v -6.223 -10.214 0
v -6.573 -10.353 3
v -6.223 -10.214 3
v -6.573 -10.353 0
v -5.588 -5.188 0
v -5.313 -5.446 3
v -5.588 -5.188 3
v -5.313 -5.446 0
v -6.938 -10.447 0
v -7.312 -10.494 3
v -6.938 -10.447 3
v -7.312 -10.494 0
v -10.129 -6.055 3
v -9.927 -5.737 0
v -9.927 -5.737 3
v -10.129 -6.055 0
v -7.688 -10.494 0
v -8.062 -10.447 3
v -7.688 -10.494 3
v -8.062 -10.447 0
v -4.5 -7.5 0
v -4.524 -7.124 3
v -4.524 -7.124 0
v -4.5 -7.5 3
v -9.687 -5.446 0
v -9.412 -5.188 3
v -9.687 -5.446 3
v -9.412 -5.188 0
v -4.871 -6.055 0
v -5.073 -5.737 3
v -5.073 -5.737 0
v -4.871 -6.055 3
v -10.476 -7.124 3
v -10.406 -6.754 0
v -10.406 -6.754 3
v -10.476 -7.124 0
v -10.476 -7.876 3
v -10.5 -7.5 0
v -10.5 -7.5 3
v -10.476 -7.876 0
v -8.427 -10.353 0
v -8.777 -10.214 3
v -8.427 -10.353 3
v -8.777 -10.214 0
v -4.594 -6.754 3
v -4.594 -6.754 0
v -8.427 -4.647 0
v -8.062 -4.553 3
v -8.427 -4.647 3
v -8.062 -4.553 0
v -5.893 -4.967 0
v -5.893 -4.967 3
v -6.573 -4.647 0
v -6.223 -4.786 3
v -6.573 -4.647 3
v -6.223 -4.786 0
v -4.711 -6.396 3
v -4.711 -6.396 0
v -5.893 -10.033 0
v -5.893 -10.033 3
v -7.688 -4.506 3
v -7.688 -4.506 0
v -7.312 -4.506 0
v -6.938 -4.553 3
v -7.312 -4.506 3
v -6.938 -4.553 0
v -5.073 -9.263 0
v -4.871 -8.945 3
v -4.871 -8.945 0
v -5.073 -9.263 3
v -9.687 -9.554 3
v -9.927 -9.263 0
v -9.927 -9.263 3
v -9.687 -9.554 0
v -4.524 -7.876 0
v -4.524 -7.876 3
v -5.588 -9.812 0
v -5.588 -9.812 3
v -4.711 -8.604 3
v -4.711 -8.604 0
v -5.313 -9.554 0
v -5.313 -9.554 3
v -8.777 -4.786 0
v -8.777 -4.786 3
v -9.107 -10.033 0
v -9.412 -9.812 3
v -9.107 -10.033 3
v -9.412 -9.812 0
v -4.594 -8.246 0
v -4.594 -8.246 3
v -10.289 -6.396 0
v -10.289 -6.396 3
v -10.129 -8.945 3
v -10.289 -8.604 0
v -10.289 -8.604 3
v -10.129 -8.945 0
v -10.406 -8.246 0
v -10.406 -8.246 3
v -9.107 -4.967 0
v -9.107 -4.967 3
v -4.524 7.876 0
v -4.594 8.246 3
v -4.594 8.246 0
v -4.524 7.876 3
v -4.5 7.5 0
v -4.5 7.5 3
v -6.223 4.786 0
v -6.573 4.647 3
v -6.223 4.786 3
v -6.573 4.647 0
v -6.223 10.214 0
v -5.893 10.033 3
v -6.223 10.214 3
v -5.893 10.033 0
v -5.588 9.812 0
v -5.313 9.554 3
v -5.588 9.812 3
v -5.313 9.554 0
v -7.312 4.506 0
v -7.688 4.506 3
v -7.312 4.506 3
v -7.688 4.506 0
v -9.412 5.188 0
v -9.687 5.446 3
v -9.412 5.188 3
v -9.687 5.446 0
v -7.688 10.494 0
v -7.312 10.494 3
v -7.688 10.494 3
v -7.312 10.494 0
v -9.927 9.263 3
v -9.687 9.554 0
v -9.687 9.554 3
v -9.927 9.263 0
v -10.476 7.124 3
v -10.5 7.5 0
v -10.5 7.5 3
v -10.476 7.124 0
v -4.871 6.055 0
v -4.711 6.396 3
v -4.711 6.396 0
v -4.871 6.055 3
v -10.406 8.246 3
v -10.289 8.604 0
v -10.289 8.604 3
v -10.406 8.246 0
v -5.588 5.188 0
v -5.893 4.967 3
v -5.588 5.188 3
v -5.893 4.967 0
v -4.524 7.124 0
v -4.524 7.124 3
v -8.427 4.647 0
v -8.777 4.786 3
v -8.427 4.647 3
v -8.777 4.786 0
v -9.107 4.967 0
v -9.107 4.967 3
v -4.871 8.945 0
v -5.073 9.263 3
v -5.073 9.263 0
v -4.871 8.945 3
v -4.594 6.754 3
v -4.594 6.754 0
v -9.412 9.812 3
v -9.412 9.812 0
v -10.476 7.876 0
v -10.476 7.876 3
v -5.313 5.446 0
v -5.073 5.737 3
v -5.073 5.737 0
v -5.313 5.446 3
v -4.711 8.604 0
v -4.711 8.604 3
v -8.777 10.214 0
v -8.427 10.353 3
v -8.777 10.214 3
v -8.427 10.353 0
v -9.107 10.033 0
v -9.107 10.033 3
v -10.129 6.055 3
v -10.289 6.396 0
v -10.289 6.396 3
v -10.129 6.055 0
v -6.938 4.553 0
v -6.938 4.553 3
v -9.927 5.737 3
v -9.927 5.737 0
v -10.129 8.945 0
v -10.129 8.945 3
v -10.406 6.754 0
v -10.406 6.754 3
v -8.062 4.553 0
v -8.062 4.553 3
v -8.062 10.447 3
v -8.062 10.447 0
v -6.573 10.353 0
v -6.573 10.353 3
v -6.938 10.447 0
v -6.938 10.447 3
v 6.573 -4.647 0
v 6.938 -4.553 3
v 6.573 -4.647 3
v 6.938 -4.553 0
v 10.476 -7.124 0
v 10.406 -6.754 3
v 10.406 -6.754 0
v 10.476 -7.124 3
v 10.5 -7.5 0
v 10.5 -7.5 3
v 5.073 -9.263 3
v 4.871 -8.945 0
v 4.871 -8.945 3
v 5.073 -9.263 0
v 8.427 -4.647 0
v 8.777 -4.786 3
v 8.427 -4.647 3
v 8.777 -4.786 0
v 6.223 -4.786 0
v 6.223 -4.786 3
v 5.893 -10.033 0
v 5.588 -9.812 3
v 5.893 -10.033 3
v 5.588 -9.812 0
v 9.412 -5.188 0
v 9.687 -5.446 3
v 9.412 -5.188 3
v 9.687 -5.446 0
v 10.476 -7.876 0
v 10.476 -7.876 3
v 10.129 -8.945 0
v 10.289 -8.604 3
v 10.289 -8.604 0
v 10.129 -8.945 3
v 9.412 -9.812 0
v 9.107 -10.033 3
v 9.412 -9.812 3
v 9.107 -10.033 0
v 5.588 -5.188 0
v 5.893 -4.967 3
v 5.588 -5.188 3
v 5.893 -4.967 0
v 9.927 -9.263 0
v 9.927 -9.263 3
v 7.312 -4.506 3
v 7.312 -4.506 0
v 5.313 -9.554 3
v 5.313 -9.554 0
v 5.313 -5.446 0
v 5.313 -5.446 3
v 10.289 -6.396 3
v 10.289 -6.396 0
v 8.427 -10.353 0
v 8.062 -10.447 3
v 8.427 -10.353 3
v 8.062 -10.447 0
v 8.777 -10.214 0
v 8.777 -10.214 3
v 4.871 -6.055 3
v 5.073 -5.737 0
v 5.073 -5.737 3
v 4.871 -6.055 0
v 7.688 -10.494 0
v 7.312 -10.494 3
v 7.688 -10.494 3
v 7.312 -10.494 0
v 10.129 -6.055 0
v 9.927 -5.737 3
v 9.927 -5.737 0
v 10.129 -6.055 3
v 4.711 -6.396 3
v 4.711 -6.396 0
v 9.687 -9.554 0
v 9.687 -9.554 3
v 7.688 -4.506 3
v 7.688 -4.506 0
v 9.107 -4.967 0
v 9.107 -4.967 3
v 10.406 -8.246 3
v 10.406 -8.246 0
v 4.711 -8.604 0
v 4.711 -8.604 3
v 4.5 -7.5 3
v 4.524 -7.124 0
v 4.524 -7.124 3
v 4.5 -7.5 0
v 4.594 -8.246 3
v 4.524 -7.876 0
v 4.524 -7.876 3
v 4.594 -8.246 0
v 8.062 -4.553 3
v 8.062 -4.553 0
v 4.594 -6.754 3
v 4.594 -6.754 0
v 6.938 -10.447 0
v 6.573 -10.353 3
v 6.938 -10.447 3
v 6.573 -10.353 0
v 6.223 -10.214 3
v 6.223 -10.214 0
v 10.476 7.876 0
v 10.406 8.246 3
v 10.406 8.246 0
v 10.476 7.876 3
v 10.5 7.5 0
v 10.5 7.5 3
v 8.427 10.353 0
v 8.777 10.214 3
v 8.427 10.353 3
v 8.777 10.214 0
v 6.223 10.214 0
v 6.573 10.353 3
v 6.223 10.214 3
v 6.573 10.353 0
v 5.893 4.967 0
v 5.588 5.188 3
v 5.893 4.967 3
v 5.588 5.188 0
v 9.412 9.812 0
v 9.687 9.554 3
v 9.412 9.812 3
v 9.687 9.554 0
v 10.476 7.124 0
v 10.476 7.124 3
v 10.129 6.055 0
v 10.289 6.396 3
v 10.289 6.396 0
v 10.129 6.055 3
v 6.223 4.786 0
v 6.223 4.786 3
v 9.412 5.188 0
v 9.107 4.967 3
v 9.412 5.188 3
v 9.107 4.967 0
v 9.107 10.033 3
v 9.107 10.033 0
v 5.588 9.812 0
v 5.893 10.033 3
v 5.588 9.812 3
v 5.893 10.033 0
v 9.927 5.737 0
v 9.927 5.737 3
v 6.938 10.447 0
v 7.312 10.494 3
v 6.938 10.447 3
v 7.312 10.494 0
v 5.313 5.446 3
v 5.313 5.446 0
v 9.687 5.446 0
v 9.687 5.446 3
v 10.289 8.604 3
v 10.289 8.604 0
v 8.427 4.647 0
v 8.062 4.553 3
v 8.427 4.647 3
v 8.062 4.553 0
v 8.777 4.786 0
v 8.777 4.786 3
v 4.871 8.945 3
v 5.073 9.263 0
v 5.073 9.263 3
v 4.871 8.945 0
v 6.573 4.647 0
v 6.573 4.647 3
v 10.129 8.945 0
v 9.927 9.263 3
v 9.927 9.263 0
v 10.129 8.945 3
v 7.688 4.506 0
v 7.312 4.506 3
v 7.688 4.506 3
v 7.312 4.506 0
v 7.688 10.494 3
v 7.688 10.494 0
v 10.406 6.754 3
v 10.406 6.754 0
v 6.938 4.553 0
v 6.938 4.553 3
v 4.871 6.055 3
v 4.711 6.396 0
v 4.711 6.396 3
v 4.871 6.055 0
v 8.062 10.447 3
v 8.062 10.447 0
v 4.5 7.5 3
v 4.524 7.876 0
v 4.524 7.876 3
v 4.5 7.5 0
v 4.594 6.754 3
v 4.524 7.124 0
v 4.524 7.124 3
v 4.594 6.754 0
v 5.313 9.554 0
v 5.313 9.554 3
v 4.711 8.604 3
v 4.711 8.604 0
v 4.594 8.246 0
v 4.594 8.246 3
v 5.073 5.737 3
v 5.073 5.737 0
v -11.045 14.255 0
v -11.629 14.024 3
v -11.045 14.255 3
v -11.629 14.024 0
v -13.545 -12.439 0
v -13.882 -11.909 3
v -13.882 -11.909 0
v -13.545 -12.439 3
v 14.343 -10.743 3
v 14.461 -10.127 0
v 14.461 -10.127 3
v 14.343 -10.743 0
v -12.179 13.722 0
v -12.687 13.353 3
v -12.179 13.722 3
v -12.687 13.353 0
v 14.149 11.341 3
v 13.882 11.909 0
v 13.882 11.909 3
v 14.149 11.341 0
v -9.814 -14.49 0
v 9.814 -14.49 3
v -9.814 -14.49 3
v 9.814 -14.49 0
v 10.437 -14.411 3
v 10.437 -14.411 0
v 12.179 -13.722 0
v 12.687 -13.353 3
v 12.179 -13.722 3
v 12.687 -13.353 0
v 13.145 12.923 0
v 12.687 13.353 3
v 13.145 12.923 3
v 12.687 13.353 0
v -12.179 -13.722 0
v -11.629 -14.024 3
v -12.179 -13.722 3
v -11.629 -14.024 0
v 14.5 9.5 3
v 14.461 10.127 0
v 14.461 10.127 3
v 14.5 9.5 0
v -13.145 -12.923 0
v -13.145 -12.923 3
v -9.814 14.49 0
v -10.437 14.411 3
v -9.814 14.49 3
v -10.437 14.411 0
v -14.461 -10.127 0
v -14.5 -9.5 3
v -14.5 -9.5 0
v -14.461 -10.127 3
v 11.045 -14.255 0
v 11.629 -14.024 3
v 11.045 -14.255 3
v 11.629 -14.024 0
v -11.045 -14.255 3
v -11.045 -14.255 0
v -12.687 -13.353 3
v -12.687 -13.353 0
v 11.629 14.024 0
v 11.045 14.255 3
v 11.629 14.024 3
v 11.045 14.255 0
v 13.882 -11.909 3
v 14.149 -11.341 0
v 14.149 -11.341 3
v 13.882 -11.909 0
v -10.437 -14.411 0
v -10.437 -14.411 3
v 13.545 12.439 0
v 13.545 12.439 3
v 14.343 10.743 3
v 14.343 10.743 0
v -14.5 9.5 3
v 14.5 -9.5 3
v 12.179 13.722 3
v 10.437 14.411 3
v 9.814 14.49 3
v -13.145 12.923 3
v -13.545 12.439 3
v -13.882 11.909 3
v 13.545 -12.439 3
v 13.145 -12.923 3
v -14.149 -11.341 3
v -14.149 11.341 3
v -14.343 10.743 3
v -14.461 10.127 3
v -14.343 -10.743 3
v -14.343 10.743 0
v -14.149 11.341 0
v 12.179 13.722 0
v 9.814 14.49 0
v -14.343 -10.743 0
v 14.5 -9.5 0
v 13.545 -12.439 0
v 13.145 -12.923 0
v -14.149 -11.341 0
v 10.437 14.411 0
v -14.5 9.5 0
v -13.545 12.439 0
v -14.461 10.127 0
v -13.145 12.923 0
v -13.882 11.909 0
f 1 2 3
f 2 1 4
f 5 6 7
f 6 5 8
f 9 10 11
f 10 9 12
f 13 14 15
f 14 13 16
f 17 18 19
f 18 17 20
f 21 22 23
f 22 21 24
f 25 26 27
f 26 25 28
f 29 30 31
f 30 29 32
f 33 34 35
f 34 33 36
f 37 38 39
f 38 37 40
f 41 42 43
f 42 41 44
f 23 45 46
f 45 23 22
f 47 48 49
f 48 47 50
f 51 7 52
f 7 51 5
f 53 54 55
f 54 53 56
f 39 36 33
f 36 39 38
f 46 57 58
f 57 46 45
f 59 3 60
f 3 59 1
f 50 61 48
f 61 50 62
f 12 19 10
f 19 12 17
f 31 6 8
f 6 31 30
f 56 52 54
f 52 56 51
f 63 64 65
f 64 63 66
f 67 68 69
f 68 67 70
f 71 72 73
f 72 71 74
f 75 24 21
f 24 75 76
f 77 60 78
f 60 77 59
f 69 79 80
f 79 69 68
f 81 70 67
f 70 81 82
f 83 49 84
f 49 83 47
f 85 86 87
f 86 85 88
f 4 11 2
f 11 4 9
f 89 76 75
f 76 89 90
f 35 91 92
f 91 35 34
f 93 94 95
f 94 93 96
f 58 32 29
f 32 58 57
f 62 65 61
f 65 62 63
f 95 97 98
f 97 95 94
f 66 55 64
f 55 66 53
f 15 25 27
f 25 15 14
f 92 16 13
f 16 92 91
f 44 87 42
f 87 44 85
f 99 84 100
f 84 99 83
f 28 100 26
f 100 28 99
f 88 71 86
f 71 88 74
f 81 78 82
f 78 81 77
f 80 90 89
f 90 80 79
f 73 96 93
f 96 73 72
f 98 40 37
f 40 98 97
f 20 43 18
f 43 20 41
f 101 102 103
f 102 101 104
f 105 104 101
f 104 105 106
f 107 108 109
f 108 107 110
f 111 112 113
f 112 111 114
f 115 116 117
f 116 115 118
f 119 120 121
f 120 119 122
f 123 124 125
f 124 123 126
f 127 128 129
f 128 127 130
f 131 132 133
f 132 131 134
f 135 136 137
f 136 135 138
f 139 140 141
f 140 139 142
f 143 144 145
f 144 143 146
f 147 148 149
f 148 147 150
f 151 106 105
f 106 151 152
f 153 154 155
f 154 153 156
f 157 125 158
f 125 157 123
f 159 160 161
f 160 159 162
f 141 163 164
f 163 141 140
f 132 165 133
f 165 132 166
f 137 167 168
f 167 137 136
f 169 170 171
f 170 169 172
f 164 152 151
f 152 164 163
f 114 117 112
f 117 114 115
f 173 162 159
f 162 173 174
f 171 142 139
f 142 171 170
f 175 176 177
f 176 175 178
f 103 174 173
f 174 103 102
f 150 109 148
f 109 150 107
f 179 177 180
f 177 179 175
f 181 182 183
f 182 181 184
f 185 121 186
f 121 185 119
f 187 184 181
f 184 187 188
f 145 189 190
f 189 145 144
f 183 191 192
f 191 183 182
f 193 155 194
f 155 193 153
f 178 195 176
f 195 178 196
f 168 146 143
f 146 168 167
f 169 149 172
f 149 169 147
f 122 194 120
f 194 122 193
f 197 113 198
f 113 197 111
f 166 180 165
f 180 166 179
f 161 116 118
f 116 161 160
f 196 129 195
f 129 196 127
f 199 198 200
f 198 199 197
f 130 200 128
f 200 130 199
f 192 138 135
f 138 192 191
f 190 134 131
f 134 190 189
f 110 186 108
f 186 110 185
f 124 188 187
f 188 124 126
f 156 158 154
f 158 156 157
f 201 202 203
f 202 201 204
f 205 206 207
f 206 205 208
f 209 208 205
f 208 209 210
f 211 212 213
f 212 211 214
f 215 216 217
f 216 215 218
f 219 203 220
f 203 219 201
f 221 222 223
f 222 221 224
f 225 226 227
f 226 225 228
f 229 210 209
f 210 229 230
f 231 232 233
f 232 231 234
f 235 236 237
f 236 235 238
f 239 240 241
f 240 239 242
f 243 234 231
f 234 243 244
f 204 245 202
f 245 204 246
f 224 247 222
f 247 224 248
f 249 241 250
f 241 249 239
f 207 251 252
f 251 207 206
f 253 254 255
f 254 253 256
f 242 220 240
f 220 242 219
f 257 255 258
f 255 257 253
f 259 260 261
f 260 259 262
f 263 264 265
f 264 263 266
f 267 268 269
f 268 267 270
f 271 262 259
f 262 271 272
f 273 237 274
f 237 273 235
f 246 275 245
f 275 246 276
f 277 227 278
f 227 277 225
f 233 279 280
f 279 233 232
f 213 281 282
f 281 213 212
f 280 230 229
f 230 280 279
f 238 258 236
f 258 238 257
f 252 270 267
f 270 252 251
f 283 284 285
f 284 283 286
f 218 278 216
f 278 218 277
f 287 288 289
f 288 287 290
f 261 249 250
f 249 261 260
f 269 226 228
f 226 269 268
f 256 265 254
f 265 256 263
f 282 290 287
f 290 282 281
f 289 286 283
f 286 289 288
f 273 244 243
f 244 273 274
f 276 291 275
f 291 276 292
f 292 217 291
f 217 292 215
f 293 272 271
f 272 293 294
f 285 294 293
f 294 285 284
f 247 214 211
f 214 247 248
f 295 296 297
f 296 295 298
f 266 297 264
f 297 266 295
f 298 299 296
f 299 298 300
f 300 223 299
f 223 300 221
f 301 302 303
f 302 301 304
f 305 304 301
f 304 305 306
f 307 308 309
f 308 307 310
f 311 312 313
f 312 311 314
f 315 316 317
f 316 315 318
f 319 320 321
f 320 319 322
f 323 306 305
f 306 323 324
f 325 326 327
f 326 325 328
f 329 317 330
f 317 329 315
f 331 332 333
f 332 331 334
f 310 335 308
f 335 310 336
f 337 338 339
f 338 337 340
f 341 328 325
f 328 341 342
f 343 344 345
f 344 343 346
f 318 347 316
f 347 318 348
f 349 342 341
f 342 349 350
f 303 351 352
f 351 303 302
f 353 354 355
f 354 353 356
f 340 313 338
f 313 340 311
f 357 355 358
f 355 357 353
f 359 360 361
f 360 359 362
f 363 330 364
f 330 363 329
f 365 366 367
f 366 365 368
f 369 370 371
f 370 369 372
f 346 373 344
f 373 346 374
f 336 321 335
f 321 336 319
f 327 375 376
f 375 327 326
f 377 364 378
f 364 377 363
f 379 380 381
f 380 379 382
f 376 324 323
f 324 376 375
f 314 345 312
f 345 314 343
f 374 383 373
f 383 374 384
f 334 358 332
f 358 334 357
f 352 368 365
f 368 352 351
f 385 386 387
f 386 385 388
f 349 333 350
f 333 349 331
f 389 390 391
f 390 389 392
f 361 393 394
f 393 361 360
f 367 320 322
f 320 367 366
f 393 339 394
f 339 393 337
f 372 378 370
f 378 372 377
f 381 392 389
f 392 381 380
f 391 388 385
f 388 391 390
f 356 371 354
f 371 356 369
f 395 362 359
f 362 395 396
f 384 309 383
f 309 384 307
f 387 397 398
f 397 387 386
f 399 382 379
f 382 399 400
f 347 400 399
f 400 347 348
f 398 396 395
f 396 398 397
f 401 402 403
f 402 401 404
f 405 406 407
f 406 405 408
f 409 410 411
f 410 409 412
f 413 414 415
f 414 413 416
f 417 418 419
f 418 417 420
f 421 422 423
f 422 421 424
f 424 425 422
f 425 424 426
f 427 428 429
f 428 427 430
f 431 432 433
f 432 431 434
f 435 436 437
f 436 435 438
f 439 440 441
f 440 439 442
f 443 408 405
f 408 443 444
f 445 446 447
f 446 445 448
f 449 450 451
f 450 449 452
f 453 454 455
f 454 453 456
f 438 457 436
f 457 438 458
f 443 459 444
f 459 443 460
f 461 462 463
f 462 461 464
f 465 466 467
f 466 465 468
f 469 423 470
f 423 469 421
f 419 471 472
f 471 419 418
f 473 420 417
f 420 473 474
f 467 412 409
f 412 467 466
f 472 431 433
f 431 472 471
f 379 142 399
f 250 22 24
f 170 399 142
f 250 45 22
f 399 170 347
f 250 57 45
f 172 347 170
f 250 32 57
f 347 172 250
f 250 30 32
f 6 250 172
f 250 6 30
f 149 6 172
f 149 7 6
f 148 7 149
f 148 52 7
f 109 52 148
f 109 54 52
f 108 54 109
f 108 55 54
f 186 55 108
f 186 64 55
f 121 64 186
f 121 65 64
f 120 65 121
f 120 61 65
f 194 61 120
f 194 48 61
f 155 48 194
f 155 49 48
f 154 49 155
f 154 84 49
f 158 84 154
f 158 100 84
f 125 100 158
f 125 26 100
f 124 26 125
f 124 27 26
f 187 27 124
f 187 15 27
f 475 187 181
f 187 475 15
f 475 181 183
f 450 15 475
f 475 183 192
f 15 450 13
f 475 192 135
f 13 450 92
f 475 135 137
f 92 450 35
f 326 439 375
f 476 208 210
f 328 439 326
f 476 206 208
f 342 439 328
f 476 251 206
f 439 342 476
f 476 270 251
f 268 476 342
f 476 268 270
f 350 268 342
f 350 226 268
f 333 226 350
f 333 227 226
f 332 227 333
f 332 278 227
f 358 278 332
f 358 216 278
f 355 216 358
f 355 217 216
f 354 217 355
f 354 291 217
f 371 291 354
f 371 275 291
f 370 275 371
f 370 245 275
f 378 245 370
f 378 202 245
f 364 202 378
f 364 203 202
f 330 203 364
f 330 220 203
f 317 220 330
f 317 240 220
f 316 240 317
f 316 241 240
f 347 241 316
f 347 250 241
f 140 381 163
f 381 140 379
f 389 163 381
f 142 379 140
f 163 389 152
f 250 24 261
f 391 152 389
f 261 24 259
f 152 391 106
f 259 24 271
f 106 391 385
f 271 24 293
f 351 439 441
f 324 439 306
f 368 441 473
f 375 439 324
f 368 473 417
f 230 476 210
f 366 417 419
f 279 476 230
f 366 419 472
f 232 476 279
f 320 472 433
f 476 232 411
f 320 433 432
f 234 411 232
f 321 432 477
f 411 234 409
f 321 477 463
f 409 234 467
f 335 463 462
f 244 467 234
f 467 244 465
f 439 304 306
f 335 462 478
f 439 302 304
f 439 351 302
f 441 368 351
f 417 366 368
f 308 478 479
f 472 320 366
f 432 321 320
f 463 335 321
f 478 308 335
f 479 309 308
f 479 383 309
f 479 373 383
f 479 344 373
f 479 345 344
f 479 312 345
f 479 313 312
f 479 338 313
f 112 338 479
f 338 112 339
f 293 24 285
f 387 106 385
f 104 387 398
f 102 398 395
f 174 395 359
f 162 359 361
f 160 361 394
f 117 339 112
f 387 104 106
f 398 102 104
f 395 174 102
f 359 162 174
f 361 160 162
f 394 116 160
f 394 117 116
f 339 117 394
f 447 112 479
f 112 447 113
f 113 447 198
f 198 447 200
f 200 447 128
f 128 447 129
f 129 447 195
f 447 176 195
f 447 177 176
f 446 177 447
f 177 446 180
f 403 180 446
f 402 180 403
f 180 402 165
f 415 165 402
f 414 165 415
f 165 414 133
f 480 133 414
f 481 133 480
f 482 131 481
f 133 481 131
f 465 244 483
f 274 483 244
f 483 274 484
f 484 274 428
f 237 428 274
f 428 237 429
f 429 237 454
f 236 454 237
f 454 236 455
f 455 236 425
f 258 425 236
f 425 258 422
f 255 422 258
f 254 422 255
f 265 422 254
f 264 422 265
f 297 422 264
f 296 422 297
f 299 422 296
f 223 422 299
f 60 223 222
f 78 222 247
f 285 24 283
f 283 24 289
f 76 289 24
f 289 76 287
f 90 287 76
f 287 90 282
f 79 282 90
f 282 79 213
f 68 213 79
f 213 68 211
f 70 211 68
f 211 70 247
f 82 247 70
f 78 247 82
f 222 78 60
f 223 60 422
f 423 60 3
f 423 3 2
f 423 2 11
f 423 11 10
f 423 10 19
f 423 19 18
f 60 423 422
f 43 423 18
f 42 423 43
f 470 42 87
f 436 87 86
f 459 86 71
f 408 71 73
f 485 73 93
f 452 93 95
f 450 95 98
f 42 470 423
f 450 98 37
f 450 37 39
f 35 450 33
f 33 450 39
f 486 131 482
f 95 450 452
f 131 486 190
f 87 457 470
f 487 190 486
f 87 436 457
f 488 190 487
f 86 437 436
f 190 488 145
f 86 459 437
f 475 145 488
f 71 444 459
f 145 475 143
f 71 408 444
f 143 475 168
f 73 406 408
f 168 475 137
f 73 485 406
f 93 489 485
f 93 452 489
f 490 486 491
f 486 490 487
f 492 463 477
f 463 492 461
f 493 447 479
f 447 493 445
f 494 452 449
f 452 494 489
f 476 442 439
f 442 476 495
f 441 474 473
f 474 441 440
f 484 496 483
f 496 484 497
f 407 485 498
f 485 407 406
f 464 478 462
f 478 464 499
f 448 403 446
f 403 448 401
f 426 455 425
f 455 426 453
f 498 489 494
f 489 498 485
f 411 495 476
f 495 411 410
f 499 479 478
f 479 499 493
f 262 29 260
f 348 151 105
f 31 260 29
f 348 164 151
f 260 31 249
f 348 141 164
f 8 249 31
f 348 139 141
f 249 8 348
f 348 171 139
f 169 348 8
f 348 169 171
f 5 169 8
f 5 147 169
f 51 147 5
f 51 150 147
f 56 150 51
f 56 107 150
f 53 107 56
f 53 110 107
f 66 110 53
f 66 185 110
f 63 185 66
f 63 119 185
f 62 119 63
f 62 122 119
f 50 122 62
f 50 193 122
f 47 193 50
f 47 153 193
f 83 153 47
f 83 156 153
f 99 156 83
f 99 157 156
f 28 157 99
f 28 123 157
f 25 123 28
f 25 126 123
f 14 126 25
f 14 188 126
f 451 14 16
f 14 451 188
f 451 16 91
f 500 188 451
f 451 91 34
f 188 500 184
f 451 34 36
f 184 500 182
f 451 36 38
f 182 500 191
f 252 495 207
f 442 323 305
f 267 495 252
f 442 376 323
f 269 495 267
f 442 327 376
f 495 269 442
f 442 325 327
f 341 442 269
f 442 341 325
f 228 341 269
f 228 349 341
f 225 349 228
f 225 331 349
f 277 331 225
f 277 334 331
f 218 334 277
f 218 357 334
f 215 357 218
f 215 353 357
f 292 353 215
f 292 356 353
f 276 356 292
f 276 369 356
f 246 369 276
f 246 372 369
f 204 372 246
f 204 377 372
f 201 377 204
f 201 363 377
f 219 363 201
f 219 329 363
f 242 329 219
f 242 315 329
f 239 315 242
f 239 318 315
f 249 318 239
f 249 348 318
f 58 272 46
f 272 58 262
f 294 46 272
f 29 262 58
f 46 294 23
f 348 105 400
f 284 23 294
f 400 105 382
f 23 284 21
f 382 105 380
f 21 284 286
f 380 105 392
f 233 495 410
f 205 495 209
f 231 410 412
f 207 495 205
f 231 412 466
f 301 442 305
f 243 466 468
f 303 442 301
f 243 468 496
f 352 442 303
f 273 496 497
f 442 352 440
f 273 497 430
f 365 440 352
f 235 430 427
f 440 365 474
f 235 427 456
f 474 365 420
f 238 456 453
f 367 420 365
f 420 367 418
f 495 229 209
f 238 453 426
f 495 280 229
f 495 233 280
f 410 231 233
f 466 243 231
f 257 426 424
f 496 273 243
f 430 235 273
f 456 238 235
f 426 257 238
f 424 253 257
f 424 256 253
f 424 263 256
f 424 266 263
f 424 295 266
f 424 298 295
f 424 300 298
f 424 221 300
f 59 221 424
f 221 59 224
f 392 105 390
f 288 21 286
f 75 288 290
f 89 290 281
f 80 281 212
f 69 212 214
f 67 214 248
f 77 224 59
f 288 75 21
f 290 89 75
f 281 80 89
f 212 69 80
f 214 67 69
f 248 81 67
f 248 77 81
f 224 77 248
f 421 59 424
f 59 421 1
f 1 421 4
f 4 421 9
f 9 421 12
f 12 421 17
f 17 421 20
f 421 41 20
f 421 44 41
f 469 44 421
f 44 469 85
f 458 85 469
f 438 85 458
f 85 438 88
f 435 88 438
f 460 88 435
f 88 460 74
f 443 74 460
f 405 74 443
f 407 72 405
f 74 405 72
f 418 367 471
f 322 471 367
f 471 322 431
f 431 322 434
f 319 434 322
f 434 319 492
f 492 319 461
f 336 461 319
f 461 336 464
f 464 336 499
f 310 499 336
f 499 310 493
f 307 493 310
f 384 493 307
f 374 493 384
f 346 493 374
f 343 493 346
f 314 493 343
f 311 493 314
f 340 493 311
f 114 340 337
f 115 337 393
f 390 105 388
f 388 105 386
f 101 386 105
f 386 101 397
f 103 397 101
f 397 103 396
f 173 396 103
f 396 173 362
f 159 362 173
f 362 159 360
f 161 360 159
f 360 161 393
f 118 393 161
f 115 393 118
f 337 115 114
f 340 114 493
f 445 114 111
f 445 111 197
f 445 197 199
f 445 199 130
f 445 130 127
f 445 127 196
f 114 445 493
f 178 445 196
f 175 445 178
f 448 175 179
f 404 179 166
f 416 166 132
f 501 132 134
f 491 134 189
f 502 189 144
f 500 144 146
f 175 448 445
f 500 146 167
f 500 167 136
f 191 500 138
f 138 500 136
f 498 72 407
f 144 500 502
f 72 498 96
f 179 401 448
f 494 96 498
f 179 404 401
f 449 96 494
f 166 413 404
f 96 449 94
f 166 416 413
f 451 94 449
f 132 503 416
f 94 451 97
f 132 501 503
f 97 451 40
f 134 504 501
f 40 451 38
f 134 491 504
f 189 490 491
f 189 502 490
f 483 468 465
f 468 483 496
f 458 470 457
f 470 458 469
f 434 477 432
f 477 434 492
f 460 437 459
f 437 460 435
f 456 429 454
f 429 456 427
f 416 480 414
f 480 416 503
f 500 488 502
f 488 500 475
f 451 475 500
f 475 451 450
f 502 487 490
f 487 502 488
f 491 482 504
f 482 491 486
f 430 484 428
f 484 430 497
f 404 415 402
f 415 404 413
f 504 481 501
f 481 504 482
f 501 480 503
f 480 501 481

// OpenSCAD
$fn = 50;


difference() {
	union() {
		hull() {
			translate(v = [-9.5000000000, 9.5000000000, 0]) {
				cylinder(h = 3, r = 5);
			}
			translate(v = [9.5000000000, 9.5000000000, 0]) {
				cylinder(h = 3, r = 5);
			}
			translate(v = [-9.5000000000, -9.5000000000, 0]) {
				cylinder(h = 3, r = 5);
			}
			translate(v = [9.5000000000, -9.5000000000, 0]) {
				cylinder(h = 3, r = 5);
			}
		}
	}
	union() {
		translate(v = [-7.5000000000, -7.5000000000, 0]) {
			translate(v = [0, 0, -100]) {
				cylinder(h = 200, r = 3.0000000000);
			}
		}
		translate(v = [-7.5000000000, 7.5000000000, 0]) {
			translate(v = [0, 0, -100]) {
				cylinder(h = 200, r = 3.0000000000);
			}
		}
		translate(v = [7.5000000000, -7.5000000000, 0]) {
			translate(v = [0, 0, -100]) {
				cylinder(h = 200, r = 3.0000000000);
			}
		}
		translate(v = [7.5000000000, 7.5000000000, 0]) {
			translate(v = [0, 0, -100]) {
				cylinder(h = 200, r = 3.0000000000);
			}
		}
	}
}
